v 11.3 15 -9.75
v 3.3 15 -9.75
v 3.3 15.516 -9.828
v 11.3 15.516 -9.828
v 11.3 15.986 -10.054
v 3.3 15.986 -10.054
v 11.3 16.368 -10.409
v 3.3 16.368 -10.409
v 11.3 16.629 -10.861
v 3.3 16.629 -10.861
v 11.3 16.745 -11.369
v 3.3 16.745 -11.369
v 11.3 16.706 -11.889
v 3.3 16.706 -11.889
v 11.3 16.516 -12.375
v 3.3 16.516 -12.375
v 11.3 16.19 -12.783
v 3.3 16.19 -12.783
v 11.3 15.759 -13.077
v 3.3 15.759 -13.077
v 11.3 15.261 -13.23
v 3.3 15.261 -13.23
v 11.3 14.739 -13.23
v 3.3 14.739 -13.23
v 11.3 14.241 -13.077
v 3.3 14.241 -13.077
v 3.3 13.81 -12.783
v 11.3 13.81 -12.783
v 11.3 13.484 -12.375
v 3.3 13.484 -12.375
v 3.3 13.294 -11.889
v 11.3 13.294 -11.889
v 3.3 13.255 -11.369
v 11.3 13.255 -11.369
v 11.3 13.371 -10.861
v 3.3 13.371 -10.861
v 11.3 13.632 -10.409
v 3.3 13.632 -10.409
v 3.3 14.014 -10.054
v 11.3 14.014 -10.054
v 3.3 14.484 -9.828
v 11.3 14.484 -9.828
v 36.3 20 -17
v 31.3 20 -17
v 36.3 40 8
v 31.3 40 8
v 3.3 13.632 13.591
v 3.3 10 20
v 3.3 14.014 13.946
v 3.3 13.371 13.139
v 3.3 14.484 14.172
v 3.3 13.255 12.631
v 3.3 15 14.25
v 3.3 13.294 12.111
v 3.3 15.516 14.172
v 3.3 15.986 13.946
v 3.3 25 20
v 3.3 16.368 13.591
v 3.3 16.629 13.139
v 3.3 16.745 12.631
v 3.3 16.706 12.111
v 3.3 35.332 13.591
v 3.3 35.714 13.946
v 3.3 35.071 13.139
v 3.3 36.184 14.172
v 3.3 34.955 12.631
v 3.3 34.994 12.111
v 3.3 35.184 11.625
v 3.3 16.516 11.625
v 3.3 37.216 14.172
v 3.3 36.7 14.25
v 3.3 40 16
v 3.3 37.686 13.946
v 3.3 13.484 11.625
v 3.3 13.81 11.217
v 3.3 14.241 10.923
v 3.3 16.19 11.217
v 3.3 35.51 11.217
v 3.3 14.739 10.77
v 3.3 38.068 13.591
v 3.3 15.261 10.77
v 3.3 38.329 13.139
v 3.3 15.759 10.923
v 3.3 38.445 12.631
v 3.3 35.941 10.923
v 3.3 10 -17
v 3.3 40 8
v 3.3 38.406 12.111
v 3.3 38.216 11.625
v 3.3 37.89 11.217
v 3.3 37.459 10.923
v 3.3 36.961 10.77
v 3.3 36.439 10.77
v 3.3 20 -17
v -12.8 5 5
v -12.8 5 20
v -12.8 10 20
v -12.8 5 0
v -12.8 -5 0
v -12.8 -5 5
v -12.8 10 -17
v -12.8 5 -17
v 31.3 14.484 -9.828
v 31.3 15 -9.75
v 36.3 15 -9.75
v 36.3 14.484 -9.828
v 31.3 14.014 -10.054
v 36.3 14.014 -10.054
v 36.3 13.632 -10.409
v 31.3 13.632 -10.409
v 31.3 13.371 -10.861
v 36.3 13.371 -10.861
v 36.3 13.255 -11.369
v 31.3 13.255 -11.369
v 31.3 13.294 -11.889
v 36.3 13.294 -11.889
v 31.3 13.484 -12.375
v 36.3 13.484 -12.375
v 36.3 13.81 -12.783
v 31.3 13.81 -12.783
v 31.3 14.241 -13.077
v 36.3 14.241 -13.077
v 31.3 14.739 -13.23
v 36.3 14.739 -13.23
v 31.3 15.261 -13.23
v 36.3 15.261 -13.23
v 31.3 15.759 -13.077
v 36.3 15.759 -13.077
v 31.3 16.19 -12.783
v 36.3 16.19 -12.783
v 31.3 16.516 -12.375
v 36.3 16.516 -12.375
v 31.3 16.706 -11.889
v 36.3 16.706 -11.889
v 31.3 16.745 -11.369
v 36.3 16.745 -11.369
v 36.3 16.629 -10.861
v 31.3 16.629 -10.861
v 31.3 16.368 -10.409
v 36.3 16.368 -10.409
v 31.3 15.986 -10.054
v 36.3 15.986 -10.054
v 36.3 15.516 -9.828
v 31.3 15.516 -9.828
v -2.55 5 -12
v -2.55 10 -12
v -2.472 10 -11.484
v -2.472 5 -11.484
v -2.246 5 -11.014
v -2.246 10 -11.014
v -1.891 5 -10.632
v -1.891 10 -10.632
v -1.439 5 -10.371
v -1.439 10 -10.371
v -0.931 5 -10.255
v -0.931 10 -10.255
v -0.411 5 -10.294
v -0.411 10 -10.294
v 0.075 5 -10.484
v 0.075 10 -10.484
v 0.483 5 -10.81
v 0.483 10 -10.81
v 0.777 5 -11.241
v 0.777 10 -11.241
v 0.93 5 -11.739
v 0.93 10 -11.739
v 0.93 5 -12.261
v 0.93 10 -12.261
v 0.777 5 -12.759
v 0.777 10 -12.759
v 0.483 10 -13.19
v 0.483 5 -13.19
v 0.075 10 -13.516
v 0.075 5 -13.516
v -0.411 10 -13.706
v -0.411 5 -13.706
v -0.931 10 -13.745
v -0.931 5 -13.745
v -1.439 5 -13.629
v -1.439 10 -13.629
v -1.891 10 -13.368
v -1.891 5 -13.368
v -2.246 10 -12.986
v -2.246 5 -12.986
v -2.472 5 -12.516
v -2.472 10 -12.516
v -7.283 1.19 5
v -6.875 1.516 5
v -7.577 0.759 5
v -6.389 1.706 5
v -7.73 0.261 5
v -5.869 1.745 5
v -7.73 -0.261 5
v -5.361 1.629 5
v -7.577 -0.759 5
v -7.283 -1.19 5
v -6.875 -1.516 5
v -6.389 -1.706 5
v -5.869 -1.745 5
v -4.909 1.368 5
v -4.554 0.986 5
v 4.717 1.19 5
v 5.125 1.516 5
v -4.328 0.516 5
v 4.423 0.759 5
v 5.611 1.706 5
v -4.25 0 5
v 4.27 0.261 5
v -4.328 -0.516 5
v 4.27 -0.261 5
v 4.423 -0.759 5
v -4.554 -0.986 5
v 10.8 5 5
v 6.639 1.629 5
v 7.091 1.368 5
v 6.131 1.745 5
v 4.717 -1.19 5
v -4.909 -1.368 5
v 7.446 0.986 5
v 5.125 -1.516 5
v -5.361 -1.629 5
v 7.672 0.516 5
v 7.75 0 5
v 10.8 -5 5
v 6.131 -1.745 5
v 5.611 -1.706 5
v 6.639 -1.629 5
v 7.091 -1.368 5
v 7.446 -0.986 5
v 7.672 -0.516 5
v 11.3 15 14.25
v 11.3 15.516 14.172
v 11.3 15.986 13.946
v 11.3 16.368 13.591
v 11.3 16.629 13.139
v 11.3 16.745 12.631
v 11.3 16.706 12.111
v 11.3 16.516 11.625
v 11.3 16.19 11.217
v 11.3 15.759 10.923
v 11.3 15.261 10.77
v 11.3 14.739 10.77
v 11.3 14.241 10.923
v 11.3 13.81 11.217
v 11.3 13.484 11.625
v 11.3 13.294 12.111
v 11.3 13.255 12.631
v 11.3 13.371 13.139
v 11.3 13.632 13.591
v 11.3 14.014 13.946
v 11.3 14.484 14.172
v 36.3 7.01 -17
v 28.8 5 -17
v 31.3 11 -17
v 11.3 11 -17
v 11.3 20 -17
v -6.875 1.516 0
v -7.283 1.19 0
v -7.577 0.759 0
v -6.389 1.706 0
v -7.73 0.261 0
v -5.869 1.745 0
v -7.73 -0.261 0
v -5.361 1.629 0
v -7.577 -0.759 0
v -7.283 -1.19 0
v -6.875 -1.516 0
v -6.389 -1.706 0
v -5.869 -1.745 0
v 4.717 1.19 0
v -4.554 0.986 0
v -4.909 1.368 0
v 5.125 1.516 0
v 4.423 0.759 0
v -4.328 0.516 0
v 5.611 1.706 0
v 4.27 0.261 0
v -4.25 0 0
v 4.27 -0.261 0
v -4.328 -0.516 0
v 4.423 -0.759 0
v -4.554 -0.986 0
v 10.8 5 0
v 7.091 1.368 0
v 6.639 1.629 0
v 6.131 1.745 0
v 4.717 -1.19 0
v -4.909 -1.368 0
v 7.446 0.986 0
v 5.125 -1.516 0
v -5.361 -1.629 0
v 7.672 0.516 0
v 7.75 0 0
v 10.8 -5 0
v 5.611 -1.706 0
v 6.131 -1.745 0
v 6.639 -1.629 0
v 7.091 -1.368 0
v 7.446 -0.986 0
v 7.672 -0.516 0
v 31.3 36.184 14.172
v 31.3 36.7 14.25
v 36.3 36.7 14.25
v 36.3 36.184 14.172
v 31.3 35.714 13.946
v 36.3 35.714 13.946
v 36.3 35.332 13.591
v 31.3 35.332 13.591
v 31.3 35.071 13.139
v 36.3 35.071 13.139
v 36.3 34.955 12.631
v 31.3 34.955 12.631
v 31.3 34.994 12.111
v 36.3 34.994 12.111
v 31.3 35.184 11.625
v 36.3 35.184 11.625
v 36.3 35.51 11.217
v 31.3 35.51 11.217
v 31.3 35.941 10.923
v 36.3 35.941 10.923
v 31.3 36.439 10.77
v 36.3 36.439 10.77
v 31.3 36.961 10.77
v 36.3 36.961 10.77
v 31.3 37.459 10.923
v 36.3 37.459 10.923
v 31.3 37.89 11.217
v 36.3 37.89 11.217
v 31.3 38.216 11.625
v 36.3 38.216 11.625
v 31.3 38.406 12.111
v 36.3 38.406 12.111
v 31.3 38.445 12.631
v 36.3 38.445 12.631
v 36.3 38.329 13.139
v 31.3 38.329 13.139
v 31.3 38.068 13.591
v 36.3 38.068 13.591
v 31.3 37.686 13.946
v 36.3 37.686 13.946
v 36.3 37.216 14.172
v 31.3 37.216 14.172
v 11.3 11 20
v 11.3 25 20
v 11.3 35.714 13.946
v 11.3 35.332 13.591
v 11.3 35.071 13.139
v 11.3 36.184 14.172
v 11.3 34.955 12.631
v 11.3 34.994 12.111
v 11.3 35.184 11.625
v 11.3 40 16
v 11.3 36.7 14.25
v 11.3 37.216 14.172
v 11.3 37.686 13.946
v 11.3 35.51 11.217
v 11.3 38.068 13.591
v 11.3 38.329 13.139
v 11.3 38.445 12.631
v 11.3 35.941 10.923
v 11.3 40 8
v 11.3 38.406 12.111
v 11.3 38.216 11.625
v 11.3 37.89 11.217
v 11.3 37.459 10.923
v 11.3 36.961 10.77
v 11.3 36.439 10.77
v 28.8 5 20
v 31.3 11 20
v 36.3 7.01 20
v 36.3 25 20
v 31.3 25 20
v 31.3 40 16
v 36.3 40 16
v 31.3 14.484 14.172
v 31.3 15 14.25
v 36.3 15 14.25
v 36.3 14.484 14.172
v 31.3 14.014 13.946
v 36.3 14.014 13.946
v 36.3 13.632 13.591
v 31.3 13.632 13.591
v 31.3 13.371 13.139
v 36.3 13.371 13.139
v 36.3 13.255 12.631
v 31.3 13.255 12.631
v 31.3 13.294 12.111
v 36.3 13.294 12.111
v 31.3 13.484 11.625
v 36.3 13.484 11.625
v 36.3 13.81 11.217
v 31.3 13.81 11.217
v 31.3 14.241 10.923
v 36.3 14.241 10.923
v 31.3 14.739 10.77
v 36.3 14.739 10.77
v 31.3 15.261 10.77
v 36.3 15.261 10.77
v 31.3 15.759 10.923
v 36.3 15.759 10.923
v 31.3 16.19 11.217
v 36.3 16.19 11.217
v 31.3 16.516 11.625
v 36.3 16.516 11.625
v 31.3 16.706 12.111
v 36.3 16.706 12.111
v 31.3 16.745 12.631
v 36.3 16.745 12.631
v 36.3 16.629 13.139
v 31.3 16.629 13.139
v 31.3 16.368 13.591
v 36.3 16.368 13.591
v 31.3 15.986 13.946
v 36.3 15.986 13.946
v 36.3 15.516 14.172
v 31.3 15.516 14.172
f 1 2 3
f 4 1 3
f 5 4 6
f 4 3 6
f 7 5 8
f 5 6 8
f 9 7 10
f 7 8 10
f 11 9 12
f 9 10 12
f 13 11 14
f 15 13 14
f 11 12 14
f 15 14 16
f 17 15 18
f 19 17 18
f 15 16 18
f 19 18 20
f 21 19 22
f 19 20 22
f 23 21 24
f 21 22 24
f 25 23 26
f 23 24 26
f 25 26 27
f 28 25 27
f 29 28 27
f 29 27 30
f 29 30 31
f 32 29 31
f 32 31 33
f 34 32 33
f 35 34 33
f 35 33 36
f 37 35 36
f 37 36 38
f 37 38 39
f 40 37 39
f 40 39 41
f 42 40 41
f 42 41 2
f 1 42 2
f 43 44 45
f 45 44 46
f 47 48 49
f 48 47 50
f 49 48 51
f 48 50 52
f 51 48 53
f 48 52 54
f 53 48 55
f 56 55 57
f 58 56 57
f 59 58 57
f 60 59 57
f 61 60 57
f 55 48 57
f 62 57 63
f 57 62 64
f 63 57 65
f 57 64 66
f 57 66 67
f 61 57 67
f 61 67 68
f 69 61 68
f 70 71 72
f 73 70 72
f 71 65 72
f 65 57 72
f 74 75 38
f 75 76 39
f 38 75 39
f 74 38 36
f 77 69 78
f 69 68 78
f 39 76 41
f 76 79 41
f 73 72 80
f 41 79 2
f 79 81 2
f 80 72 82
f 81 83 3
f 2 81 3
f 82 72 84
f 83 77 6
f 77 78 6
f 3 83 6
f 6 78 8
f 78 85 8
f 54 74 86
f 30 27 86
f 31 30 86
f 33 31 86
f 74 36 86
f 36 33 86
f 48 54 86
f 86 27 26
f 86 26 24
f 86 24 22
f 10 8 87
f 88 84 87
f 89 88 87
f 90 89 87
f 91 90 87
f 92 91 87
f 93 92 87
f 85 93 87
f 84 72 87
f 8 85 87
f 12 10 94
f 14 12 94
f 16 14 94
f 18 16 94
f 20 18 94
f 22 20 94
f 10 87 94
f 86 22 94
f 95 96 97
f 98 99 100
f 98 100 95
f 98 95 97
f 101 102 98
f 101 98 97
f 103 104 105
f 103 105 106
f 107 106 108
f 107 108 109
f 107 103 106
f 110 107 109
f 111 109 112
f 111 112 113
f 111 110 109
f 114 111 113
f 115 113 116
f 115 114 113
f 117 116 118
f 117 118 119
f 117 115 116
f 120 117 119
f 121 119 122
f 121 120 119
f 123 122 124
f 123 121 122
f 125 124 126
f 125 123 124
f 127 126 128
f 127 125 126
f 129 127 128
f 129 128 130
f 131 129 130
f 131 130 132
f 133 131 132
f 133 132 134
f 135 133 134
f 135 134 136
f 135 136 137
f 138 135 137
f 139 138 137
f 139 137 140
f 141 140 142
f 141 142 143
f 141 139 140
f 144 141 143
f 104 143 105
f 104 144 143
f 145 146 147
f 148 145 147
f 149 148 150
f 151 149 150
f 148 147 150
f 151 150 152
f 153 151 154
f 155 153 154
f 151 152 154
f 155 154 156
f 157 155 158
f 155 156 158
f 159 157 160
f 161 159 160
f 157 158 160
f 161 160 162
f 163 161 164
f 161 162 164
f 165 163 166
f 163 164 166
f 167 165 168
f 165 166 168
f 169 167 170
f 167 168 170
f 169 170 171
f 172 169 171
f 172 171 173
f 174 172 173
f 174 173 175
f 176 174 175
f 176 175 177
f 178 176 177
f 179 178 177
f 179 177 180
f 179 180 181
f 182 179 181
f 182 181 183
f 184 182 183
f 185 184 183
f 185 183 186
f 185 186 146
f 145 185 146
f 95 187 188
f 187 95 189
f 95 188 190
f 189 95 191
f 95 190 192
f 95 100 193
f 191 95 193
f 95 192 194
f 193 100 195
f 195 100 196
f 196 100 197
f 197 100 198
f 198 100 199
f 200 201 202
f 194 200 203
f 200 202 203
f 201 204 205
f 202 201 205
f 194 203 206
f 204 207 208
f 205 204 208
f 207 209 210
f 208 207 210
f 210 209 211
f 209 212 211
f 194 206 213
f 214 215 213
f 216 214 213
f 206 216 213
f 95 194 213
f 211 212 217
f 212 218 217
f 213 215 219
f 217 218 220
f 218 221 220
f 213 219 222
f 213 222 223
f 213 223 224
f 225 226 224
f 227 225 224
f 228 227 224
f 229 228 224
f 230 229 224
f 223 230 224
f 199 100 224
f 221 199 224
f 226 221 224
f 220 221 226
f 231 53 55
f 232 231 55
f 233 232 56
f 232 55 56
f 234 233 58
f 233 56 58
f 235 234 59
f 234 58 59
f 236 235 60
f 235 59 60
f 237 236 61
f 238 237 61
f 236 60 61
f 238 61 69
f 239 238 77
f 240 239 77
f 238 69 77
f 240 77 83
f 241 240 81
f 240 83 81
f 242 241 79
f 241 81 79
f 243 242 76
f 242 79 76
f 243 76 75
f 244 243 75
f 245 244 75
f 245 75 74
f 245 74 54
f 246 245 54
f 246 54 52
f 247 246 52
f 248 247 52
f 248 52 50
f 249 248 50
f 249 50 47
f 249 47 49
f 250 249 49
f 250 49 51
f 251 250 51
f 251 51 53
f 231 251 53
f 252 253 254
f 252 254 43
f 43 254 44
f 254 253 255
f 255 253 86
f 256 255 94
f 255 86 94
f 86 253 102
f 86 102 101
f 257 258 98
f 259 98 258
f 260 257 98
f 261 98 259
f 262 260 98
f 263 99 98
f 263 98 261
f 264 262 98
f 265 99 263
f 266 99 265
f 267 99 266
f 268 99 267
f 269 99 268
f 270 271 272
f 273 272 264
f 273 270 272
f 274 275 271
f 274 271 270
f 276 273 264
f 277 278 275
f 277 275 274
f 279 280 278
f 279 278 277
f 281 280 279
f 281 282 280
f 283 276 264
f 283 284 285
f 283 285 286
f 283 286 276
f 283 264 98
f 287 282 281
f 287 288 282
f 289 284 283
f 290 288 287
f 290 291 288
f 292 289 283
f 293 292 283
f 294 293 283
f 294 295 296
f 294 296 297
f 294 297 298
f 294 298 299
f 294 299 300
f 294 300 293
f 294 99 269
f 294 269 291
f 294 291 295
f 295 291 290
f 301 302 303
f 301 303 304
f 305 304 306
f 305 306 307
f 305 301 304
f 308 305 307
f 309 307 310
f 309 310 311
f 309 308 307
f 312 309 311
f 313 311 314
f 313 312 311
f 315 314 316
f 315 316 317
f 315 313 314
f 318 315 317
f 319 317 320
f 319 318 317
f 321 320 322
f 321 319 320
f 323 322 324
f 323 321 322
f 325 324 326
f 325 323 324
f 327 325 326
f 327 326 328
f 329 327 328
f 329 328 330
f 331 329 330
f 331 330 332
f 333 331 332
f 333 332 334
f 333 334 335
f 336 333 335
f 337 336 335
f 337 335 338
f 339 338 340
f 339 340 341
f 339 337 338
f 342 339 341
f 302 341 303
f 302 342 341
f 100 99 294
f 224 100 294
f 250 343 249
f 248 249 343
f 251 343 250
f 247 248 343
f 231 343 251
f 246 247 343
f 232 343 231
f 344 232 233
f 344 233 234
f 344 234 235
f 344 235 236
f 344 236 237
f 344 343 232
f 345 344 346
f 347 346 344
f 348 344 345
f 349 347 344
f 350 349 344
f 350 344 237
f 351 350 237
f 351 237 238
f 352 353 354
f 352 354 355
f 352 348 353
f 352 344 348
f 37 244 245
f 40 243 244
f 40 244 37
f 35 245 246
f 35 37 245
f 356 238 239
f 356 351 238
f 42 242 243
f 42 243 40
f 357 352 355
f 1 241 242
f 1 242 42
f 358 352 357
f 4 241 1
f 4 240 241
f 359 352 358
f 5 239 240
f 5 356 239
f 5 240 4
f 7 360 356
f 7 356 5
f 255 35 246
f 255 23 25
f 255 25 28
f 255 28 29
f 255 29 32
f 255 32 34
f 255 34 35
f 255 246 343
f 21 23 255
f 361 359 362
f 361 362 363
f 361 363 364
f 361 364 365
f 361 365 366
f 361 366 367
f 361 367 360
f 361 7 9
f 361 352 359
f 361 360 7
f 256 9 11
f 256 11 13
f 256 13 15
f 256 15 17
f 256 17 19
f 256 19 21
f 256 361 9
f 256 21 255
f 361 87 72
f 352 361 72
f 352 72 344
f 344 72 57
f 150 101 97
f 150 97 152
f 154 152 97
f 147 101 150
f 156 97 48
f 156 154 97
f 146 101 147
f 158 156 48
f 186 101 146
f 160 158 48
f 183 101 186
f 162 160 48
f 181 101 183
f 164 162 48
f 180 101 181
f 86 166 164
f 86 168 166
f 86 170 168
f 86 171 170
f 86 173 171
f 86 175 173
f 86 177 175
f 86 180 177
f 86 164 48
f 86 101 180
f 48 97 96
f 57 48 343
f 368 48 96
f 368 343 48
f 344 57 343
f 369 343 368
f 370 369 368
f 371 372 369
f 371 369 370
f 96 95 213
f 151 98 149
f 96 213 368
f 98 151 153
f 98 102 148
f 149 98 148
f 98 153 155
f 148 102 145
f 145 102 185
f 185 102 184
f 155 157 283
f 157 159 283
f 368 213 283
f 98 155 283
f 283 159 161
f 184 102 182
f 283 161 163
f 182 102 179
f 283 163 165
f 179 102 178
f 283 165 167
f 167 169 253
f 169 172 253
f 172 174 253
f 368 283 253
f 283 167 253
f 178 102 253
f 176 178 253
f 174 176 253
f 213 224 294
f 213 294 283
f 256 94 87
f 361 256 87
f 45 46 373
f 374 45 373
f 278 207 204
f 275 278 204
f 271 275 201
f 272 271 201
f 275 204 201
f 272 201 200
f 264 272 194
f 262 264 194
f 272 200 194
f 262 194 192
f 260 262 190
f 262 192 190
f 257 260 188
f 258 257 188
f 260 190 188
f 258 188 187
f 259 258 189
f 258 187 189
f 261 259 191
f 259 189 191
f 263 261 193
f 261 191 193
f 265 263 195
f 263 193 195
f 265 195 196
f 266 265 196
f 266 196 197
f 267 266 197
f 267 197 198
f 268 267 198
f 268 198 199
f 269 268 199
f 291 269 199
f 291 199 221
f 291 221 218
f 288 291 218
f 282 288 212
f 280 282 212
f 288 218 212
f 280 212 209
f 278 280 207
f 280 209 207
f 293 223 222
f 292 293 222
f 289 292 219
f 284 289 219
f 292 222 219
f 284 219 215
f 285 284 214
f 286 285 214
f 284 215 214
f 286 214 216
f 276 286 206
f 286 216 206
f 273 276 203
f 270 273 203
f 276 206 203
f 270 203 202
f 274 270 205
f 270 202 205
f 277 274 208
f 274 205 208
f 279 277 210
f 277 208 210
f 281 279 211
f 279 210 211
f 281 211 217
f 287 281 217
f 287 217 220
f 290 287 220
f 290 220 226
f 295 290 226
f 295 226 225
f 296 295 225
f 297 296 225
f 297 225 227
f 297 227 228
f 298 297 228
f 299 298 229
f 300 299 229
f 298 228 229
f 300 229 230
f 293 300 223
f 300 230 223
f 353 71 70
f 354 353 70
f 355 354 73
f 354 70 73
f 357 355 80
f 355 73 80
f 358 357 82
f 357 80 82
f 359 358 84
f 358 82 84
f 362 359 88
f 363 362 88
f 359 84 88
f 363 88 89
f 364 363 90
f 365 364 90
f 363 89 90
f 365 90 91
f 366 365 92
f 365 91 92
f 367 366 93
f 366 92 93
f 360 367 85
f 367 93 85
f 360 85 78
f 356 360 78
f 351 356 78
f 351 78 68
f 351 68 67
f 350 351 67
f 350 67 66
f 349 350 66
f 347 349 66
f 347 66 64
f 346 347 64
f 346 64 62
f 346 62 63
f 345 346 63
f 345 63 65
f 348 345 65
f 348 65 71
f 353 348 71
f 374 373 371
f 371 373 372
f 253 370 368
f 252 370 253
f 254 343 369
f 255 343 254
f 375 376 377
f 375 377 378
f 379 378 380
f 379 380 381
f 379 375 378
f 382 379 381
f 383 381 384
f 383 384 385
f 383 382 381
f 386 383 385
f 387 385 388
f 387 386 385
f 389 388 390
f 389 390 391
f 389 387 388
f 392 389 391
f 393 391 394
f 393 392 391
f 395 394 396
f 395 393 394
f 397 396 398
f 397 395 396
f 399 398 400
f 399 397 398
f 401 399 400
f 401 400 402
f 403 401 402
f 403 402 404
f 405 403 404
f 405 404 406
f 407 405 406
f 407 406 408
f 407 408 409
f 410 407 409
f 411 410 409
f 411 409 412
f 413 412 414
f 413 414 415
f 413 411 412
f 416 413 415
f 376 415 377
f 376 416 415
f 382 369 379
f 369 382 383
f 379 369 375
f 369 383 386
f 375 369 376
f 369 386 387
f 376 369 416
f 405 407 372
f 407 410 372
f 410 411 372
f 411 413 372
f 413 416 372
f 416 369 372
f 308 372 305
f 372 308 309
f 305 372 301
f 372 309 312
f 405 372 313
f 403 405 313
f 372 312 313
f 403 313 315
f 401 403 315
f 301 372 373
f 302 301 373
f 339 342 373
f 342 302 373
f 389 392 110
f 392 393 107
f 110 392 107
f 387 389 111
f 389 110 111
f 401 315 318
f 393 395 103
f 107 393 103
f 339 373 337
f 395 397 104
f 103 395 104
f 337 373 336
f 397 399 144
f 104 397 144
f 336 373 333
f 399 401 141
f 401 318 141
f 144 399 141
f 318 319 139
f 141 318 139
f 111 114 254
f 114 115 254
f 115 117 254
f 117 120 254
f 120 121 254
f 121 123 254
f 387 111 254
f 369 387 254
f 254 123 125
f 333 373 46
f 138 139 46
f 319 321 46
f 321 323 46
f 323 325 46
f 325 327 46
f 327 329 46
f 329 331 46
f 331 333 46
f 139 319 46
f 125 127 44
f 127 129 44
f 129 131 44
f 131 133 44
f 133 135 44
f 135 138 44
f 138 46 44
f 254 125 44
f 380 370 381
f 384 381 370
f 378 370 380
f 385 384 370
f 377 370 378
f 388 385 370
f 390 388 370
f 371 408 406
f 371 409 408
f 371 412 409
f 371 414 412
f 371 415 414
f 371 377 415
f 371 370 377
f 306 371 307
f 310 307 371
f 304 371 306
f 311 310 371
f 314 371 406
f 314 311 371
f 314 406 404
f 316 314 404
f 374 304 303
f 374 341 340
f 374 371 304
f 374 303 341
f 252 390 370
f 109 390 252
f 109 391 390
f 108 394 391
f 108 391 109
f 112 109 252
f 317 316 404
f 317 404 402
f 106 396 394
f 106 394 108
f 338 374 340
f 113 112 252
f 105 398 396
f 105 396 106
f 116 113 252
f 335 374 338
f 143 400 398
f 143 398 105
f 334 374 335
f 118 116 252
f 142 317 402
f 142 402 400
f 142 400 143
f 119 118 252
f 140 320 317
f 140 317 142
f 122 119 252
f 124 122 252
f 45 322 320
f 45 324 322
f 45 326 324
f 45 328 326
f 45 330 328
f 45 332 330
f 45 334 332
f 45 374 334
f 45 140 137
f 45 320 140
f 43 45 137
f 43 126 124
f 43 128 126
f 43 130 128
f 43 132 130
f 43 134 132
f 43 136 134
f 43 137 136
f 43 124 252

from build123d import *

# Parameters (mm, degrees)
SZKIC1_W                         = 25.6
SZKIC1_H                         = 10
DODANIE_WYCI_GNI_CIE1_DEPTH      = 5
SZKIC2_R                         = 1.75
WYTNIJ_WYCI_GNI_CIE1_DEPTH       = 5
SZKIC3_W                         = 25.6
SZKIC3_H                         = 5
DODANIE_WYCI_GNI_CIE2_DEPTH      = 5
SZKIC4_W                         = 25.6
SZKIC4_H                         = 5
DODANIE_WYCI_GNI_CIE3_DEPTH      = 17
SZKIC5_R                         = 1.75
WYTNIJ_WYCI_GNI_CIE2_DEPTH       = 20
SZKIC6_W                         = 2
SZKIC6_H                         = 15
WYTNIJ_WYCI_GNI_CIE3_DEPTH       = 28.346663416
DODANIE_WYCI_GNI_CIE4_DEPTH      = 0.5
DODANIE_WYCI_GNI_CIE4_DEPTH_BACK = 7.5
SZKIC8_R                         = 1.75
WYTNIJ_WYCI_GNI_CIE4_DEPTH       = 48.531147682
SZKIC9_W                         = 37
SZKIC9_H                         = 6
DODANIE_WYCI_GNI_CIE5_DEPTH      = 20.5
SZKIC10_W                        = 37
SZKIC10_H                        = 6
SZKIC10_R                        = 1.75
DODANIE_WYCI_GNI_CIE6_DEPTH      = 5
SZKIC11_W                        = 16.1
SZKIC11_H                        = 5
DODANIE_WYCI_GNI_CIE7_DEPTH      = 15
SFAZOWANIE2_SIZE                 = 7.5
SFAZOWANIE2_SIZE2                = 2.009618943


with BuildPart() as part:
    # Szkic1 → Dodanie-wyciągnięcie1 (new body)
    with BuildSketch(Plane.XY):
        Rectangle(SZKIC1_W, SZKIC1_H)
    extrude(amount=DODANIE_WYCI_GNI_CIE1_DEPTH)

    # Szkic2 → Wytnij-wyciągnięcie1 (cut)
    with BuildSketch(Plane.XY.offset(5)):
        with Locations((-6, 0)):
            Circle(SZKIC2_R)
        with Locations((6, 0)):
            Circle(SZKIC2_R)
    extrude(amount=-WYTNIJ_WYCI_GNI_CIE1_DEPTH, mode=Mode.SUBTRACT)

    # Szkic3 → Dodanie-wyciągnięcie2 (add)
    with BuildSketch(Plane(origin=(0, 5, 0), x_dir=(1, 0, 0), z_dir=(0, 1, 0))):
        with Locations((0, -2.5)):
            Rectangle(SZKIC3_W, SZKIC3_H)
    extrude(amount=DODANIE_WYCI_GNI_CIE2_DEPTH)

    # Szkic4 → Dodanie-wyciągnięcie3 (add)
    with BuildSketch(Plane(origin=(0, 0, 0), x_dir=(-1, 0, 0), z_dir=(0, 0, -1))):
        with Locations((0, 7.5)):
            Rectangle(SZKIC4_W, SZKIC4_H)
    extrude(amount=DODANIE_WYCI_GNI_CIE3_DEPTH)

    # Szkic5 → Wytnij-wyciągnięcie2 (cut)
    with BuildSketch(Plane(origin=(0, 10, 0), x_dir=(1, 0, 0), z_dir=(0, 1, 0))):
        with Locations(Location((-0.8, 12, 0), (0, 0, 180))):
            Circle(SZKIC5_R)
    extrude(amount=-WYTNIJ_WYCI_GNI_CIE2_DEPTH, mode=Mode.SUBTRACT)

    # Szkic6 → Wytnij-wyciągnięcie3 (cut, through all)
    with BuildSketch(Plane.XY.offset(5)):
        with Locations((11.8, 2.5)):
            Rectangle(SZKIC6_W, SZKIC6_H)
    extrude(amount=-WYTNIJ_WYCI_GNI_CIE3_DEPTH, mode=Mode.SUBTRACT)

    # Szkic7 → Dodanie-wyciągnięcie4 (add, two sides: drawn at the far end of the back side and taken through both)
    with BuildSketch(Plane(origin=(10.8, 0, 0), x_dir=(0, 0, -1), z_dir=(1, 0, 0)).offset(-DODANIE_WYCI_GNI_CIE4_DEPTH_BACK)):
        Polygon((-5, 10), (17, 10), (17, 20), (-8, 40), (-16, 40), (-20, 25), (-20, 5), (-5, 5), align=None)
    extrude(amount=DODANIE_WYCI_GNI_CIE4_DEPTH + DODANIE_WYCI_GNI_CIE4_DEPTH_BACK)

    # Szkic8 → Wytnij-wyciągnięcie4 (cut, through all)
    with BuildSketch(Plane.ZY.offset(-3.3)):
        with Locations((12.5, 15)):
            Circle(SZKIC8_R)
        with Locations((12.5, 36.7)):
            Circle(SZKIC8_R)
        with Locations((-11.5, 15)):
            Circle(SZKIC8_R)
    extrude(amount=-WYTNIJ_WYCI_GNI_CIE4_DEPTH, mode=Mode.SUBTRACT)

    # Szkic9 → Dodanie-wyciągnięcie5 (add)
    with BuildSketch(Plane(origin=(10.8, 0, 0), x_dir=(0, 0, -1), z_dir=(1, 0, 0))):
        with Locations((-1.5, 8)):
            Rectangle(SZKIC9_W, SZKIC9_H)
    extrude(amount=DODANIE_WYCI_GNI_CIE5_DEPTH)

    # Szkic10 → Dodanie-wyciągnięcie6 (add)
    # profile 1 of 2: a face of its own
    with BuildSketch(Plane(origin=(31.3, 0, 0), x_dir=(0, 0, -1), z_dir=(1, 0, 0))):
        with Locations((-1.5, 8)):
            Rectangle(SZKIC10_W, SZKIC10_H)
    # profile 2 of 2: a face of its own
    with BuildSketch(Plane(origin=(31.3, 0, 0), x_dir=(0, 0, -1), z_dir=(1, 0, 0))):
        Polygon((-8, 40), (-16, 40), (-20, 25), (-20, 11), (17, 11), (17, 20), align=None)
        with Locations(Location((-12.5, 15, 0), (0, 0, 180))):
            Circle(SZKIC10_R, mode=Mode.SUBTRACT)
        with Locations(Location((-12.5, 36.7, 0), (0, 0, 180))):
            Circle(SZKIC10_R, mode=Mode.SUBTRACT)
        with Locations(Location((11.5, 15, 0), (0, 0, 180))):
            Circle(SZKIC10_R, mode=Mode.SUBTRACT)
    extrude(amount=DODANIE_WYCI_GNI_CIE6_DEPTH)

    # Szkic11 → Dodanie-wyciągnięcie7 (add)
    with BuildSketch(Plane.XY.offset(5)):
        with Locations((-4.75, 7.5)):
            Rectangle(SZKIC11_W, SZKIC11_H)
    extrude(amount=DODANIE_WYCI_GNI_CIE7_DEPTH)

    # Sfazowanie2
    sfazowanie2_edges = [part.edges().sort_by_distance(p)[0] for p in [
        (36.3, 5, 1.5),
    ]]
    sfazowanie2_side = [part.faces().sort_by_distance(p)[0] for p in [
        (12.712207968, 5, 1.507036511),
    ]]
    chamfer(sfazowanie2_edges, length=SFAZOWANIE2_SIZE, length2=SFAZOWANIE2_SIZE2, reference=sfazowanie2_side[0])


solid = part.part
